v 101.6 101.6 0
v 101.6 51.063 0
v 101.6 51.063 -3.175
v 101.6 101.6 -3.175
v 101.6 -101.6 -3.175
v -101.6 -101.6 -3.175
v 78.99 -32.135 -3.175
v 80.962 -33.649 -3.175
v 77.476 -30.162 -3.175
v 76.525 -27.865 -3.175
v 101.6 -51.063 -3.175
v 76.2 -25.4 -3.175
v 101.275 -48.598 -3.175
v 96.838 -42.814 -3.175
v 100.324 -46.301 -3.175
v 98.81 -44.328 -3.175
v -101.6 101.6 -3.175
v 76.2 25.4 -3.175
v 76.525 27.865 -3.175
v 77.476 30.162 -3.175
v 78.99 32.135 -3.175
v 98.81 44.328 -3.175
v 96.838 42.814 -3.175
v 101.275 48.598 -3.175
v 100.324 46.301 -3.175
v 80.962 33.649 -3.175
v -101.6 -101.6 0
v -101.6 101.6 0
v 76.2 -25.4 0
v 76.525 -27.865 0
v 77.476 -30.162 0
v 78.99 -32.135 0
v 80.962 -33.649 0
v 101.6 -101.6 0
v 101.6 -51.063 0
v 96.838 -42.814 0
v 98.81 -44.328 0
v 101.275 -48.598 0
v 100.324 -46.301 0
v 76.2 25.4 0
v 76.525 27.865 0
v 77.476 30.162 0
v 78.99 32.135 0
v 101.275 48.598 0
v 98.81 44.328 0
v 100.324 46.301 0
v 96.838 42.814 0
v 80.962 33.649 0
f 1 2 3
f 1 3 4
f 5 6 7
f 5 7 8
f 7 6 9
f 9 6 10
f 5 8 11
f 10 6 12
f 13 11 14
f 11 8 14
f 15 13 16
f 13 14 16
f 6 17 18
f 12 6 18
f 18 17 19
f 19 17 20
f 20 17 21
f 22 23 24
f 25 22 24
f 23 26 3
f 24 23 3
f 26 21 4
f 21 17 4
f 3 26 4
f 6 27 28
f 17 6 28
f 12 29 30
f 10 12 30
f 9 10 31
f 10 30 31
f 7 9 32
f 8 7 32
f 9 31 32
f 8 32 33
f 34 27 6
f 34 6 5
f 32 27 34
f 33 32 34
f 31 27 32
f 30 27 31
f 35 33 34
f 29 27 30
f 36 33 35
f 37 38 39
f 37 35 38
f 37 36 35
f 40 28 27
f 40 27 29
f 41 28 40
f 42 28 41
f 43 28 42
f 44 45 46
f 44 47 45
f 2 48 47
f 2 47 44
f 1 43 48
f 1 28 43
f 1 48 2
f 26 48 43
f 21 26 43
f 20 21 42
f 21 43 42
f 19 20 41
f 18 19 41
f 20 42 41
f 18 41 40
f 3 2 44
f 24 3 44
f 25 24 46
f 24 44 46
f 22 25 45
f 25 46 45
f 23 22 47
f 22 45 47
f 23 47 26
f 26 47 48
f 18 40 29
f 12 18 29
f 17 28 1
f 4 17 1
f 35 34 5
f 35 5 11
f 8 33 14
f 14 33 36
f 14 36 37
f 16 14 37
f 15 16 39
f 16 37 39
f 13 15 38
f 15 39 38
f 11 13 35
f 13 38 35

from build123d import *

# Parameters (mm, degrees)
SKETCH1_W           = 203.2
SKETCH1_H           = 203.2
BOSS_EXTRUDE1_DEPTH = 3.175
CUT_EXTRUDE4_DEPTH  = 144.719172782


with BuildPart() as part:
    # Sketch1 → Boss-Extrude1 (new body)
    with BuildSketch(Plane.XY):
        Rectangle(SKETCH1_W, SKETCH1_H)
    extrude(amount=-BOSS_EXTRUDE1_DEPTH)

    # Sketch10 → Cut-Extrude4 (cut, through all)
    with BuildSketch(Plane.XY):
        with BuildLine():
            Line((96.8375, 42.814327494), (80.9625, 33.648891971))
            ThreePointArc((80.9625, 33.648891971), (77.476108029, 30.1625), (76.2, 25.4))
            Line((76.2, 25.4), (76.2, -25.4))
            ThreePointArc((76.2, -25.4), (77.476108029, -30.1625), (80.9625, -33.648891971))
            Line((80.9625, -33.648891971), (96.8375, -42.814327494))
            ThreePointArc((96.8375, -42.814327494), (100.323891971, -46.300719465), (101.6, -51.063219465))
            Line((101.6, -51.063219465), (101.6, 51.063219465))
            ThreePointArc((101.6, 51.063219465), (100.323891971, 46.300719465), (96.8375, 42.814327494))
        make_face()
    extrude(amount=-CUT_EXTRUDE4_DEPTH, mode=Mode.SUBTRACT)


solid = part.part
